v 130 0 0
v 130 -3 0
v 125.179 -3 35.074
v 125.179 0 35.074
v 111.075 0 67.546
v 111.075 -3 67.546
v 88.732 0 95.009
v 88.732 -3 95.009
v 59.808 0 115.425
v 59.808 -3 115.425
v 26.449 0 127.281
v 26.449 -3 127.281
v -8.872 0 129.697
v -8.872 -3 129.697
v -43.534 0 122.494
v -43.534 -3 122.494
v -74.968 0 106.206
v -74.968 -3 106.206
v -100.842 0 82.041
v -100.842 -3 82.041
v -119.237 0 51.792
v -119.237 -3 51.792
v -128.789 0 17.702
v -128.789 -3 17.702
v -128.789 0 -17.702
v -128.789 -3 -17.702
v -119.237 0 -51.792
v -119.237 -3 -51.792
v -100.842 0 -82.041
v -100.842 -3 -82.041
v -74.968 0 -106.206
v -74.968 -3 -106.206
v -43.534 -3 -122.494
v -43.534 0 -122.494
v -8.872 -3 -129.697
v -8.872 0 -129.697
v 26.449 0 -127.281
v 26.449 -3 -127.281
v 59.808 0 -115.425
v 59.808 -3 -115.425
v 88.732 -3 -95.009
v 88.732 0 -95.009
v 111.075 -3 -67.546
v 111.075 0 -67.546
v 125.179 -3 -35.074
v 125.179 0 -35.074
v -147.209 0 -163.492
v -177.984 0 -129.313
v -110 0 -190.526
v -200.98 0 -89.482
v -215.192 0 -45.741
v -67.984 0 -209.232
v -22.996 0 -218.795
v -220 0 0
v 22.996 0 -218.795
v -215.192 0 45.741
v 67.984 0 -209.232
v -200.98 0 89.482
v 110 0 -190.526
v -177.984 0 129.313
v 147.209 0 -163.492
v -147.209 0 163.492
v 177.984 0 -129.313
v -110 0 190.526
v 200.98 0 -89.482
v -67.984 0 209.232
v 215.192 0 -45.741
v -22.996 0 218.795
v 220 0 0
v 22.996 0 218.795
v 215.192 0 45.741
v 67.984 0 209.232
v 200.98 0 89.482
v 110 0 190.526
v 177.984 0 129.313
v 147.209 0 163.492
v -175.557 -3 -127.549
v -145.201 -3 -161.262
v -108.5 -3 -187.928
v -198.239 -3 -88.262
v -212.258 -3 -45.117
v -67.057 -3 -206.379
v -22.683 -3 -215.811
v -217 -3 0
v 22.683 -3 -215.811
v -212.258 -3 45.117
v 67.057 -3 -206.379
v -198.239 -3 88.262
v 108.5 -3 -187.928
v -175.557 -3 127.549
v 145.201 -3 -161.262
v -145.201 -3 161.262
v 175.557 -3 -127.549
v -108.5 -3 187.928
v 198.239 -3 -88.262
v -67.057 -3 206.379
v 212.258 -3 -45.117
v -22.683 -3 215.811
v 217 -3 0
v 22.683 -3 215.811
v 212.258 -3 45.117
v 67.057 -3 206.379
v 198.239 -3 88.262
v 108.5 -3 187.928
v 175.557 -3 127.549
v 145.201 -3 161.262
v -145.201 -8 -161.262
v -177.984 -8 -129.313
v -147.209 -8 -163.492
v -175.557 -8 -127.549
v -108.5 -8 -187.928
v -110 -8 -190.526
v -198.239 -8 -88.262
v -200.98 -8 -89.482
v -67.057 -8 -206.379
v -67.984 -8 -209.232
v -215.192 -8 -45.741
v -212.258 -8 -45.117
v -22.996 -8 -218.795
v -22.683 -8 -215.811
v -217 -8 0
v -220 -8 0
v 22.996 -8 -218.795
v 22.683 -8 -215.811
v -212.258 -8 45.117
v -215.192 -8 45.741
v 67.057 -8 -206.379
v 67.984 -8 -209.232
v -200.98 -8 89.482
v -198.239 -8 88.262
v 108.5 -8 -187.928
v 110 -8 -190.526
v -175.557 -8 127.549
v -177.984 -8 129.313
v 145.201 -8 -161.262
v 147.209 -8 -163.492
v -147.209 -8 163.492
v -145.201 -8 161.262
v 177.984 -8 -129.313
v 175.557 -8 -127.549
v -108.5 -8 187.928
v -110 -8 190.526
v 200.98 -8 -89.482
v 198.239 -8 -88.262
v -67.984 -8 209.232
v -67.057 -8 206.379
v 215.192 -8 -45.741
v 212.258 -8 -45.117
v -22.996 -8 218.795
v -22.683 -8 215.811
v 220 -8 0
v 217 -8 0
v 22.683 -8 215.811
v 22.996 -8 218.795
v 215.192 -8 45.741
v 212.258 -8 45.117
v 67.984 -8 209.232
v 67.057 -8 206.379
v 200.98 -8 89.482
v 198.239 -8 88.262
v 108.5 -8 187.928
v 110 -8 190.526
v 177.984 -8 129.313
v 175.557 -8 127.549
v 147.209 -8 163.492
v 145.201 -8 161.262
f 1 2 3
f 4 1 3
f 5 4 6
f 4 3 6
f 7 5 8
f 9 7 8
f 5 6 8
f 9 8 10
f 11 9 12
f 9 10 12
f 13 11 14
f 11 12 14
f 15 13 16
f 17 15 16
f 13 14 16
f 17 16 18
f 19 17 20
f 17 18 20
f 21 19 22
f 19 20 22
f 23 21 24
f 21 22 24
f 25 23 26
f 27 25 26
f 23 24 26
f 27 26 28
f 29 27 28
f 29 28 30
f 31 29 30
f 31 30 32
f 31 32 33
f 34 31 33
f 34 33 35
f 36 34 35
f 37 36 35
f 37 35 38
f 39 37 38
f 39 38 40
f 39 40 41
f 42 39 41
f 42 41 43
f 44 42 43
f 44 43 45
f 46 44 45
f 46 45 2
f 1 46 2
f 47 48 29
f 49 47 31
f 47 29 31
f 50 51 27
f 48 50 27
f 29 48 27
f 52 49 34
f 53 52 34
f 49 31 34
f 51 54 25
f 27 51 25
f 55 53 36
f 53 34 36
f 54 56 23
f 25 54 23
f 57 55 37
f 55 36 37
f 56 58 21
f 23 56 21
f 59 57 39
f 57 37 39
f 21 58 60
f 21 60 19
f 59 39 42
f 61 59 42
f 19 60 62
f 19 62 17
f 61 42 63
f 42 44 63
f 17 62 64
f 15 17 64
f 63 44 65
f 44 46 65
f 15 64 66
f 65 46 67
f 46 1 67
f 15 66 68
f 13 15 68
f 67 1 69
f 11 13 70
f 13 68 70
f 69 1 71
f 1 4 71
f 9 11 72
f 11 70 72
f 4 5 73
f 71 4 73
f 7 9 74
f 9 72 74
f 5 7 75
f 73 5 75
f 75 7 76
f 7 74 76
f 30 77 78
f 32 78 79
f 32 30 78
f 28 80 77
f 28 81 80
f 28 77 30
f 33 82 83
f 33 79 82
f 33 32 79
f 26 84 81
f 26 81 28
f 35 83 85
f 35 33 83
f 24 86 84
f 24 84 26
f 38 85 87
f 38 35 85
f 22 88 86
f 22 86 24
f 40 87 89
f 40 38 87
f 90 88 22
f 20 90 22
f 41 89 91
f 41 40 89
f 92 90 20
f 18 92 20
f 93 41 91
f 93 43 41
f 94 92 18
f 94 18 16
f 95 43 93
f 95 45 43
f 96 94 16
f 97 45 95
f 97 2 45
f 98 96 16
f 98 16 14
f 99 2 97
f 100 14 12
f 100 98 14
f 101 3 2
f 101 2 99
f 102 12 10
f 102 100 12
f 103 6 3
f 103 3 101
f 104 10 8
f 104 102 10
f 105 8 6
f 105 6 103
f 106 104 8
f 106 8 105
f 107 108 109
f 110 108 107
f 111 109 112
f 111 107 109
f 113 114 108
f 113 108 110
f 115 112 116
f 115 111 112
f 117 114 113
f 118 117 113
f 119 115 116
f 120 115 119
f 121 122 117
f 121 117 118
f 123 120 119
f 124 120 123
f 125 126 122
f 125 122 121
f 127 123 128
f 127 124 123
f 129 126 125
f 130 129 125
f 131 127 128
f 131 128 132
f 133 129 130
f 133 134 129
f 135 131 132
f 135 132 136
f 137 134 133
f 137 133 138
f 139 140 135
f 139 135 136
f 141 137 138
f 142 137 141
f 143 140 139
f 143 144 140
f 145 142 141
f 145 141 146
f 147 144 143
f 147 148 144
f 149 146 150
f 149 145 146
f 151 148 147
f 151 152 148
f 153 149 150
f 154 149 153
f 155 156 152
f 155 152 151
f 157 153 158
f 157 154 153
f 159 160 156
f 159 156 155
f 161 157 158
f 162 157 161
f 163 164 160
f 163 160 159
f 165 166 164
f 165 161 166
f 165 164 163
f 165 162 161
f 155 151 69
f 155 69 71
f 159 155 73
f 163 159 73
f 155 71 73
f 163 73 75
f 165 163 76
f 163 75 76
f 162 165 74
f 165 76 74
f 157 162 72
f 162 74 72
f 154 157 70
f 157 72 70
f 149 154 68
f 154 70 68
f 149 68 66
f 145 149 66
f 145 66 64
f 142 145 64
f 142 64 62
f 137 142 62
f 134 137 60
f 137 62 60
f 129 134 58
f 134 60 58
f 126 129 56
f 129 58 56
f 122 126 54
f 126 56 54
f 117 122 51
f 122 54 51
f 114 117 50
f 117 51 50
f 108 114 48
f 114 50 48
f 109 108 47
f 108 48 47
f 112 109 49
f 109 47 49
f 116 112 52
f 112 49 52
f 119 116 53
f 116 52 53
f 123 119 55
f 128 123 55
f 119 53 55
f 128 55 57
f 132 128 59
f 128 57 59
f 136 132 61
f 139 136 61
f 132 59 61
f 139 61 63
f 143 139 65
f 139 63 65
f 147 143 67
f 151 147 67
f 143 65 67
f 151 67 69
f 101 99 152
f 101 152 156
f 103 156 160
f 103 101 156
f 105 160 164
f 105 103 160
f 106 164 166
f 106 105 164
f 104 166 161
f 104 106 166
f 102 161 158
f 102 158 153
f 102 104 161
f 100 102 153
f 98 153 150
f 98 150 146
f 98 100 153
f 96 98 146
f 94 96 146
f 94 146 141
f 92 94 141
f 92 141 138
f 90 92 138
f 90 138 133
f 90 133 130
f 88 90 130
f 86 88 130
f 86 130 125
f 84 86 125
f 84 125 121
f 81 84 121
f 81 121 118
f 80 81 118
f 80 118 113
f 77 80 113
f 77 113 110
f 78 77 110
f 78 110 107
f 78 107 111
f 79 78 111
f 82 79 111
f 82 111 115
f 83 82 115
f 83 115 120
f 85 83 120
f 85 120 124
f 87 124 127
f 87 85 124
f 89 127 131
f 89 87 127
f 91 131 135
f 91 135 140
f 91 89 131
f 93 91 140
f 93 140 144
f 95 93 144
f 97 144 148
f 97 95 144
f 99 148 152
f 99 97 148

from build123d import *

# Parameters (mm, degrees)
F0_R     = 220
F1_DEPTH = 8
F2_T     = -3
F3_R     = 130
F4_DEPTH = 8.001


with BuildPart() as f1:
    # F0 (on Front) → F1 (new body)
    with BuildSketch(Plane.XZ):
        Circle(F0_R)
    extrude(amount=F1_DEPTH)

    # F2
    f2_openings = [f1.faces().sort_by_distance(p)[0] for p in [
        (0, -8, 0),
    ]]
    offset(amount=F2_T, openings=f2_openings)

    # F3 (on face) → F4 (cut, through all)
    with BuildSketch(Plane.XZ.offset(8)):
        Circle(F3_R)
    extrude(amount=-F4_DEPTH, mode=Mode.SUBTRACT)


solid = f1.part
